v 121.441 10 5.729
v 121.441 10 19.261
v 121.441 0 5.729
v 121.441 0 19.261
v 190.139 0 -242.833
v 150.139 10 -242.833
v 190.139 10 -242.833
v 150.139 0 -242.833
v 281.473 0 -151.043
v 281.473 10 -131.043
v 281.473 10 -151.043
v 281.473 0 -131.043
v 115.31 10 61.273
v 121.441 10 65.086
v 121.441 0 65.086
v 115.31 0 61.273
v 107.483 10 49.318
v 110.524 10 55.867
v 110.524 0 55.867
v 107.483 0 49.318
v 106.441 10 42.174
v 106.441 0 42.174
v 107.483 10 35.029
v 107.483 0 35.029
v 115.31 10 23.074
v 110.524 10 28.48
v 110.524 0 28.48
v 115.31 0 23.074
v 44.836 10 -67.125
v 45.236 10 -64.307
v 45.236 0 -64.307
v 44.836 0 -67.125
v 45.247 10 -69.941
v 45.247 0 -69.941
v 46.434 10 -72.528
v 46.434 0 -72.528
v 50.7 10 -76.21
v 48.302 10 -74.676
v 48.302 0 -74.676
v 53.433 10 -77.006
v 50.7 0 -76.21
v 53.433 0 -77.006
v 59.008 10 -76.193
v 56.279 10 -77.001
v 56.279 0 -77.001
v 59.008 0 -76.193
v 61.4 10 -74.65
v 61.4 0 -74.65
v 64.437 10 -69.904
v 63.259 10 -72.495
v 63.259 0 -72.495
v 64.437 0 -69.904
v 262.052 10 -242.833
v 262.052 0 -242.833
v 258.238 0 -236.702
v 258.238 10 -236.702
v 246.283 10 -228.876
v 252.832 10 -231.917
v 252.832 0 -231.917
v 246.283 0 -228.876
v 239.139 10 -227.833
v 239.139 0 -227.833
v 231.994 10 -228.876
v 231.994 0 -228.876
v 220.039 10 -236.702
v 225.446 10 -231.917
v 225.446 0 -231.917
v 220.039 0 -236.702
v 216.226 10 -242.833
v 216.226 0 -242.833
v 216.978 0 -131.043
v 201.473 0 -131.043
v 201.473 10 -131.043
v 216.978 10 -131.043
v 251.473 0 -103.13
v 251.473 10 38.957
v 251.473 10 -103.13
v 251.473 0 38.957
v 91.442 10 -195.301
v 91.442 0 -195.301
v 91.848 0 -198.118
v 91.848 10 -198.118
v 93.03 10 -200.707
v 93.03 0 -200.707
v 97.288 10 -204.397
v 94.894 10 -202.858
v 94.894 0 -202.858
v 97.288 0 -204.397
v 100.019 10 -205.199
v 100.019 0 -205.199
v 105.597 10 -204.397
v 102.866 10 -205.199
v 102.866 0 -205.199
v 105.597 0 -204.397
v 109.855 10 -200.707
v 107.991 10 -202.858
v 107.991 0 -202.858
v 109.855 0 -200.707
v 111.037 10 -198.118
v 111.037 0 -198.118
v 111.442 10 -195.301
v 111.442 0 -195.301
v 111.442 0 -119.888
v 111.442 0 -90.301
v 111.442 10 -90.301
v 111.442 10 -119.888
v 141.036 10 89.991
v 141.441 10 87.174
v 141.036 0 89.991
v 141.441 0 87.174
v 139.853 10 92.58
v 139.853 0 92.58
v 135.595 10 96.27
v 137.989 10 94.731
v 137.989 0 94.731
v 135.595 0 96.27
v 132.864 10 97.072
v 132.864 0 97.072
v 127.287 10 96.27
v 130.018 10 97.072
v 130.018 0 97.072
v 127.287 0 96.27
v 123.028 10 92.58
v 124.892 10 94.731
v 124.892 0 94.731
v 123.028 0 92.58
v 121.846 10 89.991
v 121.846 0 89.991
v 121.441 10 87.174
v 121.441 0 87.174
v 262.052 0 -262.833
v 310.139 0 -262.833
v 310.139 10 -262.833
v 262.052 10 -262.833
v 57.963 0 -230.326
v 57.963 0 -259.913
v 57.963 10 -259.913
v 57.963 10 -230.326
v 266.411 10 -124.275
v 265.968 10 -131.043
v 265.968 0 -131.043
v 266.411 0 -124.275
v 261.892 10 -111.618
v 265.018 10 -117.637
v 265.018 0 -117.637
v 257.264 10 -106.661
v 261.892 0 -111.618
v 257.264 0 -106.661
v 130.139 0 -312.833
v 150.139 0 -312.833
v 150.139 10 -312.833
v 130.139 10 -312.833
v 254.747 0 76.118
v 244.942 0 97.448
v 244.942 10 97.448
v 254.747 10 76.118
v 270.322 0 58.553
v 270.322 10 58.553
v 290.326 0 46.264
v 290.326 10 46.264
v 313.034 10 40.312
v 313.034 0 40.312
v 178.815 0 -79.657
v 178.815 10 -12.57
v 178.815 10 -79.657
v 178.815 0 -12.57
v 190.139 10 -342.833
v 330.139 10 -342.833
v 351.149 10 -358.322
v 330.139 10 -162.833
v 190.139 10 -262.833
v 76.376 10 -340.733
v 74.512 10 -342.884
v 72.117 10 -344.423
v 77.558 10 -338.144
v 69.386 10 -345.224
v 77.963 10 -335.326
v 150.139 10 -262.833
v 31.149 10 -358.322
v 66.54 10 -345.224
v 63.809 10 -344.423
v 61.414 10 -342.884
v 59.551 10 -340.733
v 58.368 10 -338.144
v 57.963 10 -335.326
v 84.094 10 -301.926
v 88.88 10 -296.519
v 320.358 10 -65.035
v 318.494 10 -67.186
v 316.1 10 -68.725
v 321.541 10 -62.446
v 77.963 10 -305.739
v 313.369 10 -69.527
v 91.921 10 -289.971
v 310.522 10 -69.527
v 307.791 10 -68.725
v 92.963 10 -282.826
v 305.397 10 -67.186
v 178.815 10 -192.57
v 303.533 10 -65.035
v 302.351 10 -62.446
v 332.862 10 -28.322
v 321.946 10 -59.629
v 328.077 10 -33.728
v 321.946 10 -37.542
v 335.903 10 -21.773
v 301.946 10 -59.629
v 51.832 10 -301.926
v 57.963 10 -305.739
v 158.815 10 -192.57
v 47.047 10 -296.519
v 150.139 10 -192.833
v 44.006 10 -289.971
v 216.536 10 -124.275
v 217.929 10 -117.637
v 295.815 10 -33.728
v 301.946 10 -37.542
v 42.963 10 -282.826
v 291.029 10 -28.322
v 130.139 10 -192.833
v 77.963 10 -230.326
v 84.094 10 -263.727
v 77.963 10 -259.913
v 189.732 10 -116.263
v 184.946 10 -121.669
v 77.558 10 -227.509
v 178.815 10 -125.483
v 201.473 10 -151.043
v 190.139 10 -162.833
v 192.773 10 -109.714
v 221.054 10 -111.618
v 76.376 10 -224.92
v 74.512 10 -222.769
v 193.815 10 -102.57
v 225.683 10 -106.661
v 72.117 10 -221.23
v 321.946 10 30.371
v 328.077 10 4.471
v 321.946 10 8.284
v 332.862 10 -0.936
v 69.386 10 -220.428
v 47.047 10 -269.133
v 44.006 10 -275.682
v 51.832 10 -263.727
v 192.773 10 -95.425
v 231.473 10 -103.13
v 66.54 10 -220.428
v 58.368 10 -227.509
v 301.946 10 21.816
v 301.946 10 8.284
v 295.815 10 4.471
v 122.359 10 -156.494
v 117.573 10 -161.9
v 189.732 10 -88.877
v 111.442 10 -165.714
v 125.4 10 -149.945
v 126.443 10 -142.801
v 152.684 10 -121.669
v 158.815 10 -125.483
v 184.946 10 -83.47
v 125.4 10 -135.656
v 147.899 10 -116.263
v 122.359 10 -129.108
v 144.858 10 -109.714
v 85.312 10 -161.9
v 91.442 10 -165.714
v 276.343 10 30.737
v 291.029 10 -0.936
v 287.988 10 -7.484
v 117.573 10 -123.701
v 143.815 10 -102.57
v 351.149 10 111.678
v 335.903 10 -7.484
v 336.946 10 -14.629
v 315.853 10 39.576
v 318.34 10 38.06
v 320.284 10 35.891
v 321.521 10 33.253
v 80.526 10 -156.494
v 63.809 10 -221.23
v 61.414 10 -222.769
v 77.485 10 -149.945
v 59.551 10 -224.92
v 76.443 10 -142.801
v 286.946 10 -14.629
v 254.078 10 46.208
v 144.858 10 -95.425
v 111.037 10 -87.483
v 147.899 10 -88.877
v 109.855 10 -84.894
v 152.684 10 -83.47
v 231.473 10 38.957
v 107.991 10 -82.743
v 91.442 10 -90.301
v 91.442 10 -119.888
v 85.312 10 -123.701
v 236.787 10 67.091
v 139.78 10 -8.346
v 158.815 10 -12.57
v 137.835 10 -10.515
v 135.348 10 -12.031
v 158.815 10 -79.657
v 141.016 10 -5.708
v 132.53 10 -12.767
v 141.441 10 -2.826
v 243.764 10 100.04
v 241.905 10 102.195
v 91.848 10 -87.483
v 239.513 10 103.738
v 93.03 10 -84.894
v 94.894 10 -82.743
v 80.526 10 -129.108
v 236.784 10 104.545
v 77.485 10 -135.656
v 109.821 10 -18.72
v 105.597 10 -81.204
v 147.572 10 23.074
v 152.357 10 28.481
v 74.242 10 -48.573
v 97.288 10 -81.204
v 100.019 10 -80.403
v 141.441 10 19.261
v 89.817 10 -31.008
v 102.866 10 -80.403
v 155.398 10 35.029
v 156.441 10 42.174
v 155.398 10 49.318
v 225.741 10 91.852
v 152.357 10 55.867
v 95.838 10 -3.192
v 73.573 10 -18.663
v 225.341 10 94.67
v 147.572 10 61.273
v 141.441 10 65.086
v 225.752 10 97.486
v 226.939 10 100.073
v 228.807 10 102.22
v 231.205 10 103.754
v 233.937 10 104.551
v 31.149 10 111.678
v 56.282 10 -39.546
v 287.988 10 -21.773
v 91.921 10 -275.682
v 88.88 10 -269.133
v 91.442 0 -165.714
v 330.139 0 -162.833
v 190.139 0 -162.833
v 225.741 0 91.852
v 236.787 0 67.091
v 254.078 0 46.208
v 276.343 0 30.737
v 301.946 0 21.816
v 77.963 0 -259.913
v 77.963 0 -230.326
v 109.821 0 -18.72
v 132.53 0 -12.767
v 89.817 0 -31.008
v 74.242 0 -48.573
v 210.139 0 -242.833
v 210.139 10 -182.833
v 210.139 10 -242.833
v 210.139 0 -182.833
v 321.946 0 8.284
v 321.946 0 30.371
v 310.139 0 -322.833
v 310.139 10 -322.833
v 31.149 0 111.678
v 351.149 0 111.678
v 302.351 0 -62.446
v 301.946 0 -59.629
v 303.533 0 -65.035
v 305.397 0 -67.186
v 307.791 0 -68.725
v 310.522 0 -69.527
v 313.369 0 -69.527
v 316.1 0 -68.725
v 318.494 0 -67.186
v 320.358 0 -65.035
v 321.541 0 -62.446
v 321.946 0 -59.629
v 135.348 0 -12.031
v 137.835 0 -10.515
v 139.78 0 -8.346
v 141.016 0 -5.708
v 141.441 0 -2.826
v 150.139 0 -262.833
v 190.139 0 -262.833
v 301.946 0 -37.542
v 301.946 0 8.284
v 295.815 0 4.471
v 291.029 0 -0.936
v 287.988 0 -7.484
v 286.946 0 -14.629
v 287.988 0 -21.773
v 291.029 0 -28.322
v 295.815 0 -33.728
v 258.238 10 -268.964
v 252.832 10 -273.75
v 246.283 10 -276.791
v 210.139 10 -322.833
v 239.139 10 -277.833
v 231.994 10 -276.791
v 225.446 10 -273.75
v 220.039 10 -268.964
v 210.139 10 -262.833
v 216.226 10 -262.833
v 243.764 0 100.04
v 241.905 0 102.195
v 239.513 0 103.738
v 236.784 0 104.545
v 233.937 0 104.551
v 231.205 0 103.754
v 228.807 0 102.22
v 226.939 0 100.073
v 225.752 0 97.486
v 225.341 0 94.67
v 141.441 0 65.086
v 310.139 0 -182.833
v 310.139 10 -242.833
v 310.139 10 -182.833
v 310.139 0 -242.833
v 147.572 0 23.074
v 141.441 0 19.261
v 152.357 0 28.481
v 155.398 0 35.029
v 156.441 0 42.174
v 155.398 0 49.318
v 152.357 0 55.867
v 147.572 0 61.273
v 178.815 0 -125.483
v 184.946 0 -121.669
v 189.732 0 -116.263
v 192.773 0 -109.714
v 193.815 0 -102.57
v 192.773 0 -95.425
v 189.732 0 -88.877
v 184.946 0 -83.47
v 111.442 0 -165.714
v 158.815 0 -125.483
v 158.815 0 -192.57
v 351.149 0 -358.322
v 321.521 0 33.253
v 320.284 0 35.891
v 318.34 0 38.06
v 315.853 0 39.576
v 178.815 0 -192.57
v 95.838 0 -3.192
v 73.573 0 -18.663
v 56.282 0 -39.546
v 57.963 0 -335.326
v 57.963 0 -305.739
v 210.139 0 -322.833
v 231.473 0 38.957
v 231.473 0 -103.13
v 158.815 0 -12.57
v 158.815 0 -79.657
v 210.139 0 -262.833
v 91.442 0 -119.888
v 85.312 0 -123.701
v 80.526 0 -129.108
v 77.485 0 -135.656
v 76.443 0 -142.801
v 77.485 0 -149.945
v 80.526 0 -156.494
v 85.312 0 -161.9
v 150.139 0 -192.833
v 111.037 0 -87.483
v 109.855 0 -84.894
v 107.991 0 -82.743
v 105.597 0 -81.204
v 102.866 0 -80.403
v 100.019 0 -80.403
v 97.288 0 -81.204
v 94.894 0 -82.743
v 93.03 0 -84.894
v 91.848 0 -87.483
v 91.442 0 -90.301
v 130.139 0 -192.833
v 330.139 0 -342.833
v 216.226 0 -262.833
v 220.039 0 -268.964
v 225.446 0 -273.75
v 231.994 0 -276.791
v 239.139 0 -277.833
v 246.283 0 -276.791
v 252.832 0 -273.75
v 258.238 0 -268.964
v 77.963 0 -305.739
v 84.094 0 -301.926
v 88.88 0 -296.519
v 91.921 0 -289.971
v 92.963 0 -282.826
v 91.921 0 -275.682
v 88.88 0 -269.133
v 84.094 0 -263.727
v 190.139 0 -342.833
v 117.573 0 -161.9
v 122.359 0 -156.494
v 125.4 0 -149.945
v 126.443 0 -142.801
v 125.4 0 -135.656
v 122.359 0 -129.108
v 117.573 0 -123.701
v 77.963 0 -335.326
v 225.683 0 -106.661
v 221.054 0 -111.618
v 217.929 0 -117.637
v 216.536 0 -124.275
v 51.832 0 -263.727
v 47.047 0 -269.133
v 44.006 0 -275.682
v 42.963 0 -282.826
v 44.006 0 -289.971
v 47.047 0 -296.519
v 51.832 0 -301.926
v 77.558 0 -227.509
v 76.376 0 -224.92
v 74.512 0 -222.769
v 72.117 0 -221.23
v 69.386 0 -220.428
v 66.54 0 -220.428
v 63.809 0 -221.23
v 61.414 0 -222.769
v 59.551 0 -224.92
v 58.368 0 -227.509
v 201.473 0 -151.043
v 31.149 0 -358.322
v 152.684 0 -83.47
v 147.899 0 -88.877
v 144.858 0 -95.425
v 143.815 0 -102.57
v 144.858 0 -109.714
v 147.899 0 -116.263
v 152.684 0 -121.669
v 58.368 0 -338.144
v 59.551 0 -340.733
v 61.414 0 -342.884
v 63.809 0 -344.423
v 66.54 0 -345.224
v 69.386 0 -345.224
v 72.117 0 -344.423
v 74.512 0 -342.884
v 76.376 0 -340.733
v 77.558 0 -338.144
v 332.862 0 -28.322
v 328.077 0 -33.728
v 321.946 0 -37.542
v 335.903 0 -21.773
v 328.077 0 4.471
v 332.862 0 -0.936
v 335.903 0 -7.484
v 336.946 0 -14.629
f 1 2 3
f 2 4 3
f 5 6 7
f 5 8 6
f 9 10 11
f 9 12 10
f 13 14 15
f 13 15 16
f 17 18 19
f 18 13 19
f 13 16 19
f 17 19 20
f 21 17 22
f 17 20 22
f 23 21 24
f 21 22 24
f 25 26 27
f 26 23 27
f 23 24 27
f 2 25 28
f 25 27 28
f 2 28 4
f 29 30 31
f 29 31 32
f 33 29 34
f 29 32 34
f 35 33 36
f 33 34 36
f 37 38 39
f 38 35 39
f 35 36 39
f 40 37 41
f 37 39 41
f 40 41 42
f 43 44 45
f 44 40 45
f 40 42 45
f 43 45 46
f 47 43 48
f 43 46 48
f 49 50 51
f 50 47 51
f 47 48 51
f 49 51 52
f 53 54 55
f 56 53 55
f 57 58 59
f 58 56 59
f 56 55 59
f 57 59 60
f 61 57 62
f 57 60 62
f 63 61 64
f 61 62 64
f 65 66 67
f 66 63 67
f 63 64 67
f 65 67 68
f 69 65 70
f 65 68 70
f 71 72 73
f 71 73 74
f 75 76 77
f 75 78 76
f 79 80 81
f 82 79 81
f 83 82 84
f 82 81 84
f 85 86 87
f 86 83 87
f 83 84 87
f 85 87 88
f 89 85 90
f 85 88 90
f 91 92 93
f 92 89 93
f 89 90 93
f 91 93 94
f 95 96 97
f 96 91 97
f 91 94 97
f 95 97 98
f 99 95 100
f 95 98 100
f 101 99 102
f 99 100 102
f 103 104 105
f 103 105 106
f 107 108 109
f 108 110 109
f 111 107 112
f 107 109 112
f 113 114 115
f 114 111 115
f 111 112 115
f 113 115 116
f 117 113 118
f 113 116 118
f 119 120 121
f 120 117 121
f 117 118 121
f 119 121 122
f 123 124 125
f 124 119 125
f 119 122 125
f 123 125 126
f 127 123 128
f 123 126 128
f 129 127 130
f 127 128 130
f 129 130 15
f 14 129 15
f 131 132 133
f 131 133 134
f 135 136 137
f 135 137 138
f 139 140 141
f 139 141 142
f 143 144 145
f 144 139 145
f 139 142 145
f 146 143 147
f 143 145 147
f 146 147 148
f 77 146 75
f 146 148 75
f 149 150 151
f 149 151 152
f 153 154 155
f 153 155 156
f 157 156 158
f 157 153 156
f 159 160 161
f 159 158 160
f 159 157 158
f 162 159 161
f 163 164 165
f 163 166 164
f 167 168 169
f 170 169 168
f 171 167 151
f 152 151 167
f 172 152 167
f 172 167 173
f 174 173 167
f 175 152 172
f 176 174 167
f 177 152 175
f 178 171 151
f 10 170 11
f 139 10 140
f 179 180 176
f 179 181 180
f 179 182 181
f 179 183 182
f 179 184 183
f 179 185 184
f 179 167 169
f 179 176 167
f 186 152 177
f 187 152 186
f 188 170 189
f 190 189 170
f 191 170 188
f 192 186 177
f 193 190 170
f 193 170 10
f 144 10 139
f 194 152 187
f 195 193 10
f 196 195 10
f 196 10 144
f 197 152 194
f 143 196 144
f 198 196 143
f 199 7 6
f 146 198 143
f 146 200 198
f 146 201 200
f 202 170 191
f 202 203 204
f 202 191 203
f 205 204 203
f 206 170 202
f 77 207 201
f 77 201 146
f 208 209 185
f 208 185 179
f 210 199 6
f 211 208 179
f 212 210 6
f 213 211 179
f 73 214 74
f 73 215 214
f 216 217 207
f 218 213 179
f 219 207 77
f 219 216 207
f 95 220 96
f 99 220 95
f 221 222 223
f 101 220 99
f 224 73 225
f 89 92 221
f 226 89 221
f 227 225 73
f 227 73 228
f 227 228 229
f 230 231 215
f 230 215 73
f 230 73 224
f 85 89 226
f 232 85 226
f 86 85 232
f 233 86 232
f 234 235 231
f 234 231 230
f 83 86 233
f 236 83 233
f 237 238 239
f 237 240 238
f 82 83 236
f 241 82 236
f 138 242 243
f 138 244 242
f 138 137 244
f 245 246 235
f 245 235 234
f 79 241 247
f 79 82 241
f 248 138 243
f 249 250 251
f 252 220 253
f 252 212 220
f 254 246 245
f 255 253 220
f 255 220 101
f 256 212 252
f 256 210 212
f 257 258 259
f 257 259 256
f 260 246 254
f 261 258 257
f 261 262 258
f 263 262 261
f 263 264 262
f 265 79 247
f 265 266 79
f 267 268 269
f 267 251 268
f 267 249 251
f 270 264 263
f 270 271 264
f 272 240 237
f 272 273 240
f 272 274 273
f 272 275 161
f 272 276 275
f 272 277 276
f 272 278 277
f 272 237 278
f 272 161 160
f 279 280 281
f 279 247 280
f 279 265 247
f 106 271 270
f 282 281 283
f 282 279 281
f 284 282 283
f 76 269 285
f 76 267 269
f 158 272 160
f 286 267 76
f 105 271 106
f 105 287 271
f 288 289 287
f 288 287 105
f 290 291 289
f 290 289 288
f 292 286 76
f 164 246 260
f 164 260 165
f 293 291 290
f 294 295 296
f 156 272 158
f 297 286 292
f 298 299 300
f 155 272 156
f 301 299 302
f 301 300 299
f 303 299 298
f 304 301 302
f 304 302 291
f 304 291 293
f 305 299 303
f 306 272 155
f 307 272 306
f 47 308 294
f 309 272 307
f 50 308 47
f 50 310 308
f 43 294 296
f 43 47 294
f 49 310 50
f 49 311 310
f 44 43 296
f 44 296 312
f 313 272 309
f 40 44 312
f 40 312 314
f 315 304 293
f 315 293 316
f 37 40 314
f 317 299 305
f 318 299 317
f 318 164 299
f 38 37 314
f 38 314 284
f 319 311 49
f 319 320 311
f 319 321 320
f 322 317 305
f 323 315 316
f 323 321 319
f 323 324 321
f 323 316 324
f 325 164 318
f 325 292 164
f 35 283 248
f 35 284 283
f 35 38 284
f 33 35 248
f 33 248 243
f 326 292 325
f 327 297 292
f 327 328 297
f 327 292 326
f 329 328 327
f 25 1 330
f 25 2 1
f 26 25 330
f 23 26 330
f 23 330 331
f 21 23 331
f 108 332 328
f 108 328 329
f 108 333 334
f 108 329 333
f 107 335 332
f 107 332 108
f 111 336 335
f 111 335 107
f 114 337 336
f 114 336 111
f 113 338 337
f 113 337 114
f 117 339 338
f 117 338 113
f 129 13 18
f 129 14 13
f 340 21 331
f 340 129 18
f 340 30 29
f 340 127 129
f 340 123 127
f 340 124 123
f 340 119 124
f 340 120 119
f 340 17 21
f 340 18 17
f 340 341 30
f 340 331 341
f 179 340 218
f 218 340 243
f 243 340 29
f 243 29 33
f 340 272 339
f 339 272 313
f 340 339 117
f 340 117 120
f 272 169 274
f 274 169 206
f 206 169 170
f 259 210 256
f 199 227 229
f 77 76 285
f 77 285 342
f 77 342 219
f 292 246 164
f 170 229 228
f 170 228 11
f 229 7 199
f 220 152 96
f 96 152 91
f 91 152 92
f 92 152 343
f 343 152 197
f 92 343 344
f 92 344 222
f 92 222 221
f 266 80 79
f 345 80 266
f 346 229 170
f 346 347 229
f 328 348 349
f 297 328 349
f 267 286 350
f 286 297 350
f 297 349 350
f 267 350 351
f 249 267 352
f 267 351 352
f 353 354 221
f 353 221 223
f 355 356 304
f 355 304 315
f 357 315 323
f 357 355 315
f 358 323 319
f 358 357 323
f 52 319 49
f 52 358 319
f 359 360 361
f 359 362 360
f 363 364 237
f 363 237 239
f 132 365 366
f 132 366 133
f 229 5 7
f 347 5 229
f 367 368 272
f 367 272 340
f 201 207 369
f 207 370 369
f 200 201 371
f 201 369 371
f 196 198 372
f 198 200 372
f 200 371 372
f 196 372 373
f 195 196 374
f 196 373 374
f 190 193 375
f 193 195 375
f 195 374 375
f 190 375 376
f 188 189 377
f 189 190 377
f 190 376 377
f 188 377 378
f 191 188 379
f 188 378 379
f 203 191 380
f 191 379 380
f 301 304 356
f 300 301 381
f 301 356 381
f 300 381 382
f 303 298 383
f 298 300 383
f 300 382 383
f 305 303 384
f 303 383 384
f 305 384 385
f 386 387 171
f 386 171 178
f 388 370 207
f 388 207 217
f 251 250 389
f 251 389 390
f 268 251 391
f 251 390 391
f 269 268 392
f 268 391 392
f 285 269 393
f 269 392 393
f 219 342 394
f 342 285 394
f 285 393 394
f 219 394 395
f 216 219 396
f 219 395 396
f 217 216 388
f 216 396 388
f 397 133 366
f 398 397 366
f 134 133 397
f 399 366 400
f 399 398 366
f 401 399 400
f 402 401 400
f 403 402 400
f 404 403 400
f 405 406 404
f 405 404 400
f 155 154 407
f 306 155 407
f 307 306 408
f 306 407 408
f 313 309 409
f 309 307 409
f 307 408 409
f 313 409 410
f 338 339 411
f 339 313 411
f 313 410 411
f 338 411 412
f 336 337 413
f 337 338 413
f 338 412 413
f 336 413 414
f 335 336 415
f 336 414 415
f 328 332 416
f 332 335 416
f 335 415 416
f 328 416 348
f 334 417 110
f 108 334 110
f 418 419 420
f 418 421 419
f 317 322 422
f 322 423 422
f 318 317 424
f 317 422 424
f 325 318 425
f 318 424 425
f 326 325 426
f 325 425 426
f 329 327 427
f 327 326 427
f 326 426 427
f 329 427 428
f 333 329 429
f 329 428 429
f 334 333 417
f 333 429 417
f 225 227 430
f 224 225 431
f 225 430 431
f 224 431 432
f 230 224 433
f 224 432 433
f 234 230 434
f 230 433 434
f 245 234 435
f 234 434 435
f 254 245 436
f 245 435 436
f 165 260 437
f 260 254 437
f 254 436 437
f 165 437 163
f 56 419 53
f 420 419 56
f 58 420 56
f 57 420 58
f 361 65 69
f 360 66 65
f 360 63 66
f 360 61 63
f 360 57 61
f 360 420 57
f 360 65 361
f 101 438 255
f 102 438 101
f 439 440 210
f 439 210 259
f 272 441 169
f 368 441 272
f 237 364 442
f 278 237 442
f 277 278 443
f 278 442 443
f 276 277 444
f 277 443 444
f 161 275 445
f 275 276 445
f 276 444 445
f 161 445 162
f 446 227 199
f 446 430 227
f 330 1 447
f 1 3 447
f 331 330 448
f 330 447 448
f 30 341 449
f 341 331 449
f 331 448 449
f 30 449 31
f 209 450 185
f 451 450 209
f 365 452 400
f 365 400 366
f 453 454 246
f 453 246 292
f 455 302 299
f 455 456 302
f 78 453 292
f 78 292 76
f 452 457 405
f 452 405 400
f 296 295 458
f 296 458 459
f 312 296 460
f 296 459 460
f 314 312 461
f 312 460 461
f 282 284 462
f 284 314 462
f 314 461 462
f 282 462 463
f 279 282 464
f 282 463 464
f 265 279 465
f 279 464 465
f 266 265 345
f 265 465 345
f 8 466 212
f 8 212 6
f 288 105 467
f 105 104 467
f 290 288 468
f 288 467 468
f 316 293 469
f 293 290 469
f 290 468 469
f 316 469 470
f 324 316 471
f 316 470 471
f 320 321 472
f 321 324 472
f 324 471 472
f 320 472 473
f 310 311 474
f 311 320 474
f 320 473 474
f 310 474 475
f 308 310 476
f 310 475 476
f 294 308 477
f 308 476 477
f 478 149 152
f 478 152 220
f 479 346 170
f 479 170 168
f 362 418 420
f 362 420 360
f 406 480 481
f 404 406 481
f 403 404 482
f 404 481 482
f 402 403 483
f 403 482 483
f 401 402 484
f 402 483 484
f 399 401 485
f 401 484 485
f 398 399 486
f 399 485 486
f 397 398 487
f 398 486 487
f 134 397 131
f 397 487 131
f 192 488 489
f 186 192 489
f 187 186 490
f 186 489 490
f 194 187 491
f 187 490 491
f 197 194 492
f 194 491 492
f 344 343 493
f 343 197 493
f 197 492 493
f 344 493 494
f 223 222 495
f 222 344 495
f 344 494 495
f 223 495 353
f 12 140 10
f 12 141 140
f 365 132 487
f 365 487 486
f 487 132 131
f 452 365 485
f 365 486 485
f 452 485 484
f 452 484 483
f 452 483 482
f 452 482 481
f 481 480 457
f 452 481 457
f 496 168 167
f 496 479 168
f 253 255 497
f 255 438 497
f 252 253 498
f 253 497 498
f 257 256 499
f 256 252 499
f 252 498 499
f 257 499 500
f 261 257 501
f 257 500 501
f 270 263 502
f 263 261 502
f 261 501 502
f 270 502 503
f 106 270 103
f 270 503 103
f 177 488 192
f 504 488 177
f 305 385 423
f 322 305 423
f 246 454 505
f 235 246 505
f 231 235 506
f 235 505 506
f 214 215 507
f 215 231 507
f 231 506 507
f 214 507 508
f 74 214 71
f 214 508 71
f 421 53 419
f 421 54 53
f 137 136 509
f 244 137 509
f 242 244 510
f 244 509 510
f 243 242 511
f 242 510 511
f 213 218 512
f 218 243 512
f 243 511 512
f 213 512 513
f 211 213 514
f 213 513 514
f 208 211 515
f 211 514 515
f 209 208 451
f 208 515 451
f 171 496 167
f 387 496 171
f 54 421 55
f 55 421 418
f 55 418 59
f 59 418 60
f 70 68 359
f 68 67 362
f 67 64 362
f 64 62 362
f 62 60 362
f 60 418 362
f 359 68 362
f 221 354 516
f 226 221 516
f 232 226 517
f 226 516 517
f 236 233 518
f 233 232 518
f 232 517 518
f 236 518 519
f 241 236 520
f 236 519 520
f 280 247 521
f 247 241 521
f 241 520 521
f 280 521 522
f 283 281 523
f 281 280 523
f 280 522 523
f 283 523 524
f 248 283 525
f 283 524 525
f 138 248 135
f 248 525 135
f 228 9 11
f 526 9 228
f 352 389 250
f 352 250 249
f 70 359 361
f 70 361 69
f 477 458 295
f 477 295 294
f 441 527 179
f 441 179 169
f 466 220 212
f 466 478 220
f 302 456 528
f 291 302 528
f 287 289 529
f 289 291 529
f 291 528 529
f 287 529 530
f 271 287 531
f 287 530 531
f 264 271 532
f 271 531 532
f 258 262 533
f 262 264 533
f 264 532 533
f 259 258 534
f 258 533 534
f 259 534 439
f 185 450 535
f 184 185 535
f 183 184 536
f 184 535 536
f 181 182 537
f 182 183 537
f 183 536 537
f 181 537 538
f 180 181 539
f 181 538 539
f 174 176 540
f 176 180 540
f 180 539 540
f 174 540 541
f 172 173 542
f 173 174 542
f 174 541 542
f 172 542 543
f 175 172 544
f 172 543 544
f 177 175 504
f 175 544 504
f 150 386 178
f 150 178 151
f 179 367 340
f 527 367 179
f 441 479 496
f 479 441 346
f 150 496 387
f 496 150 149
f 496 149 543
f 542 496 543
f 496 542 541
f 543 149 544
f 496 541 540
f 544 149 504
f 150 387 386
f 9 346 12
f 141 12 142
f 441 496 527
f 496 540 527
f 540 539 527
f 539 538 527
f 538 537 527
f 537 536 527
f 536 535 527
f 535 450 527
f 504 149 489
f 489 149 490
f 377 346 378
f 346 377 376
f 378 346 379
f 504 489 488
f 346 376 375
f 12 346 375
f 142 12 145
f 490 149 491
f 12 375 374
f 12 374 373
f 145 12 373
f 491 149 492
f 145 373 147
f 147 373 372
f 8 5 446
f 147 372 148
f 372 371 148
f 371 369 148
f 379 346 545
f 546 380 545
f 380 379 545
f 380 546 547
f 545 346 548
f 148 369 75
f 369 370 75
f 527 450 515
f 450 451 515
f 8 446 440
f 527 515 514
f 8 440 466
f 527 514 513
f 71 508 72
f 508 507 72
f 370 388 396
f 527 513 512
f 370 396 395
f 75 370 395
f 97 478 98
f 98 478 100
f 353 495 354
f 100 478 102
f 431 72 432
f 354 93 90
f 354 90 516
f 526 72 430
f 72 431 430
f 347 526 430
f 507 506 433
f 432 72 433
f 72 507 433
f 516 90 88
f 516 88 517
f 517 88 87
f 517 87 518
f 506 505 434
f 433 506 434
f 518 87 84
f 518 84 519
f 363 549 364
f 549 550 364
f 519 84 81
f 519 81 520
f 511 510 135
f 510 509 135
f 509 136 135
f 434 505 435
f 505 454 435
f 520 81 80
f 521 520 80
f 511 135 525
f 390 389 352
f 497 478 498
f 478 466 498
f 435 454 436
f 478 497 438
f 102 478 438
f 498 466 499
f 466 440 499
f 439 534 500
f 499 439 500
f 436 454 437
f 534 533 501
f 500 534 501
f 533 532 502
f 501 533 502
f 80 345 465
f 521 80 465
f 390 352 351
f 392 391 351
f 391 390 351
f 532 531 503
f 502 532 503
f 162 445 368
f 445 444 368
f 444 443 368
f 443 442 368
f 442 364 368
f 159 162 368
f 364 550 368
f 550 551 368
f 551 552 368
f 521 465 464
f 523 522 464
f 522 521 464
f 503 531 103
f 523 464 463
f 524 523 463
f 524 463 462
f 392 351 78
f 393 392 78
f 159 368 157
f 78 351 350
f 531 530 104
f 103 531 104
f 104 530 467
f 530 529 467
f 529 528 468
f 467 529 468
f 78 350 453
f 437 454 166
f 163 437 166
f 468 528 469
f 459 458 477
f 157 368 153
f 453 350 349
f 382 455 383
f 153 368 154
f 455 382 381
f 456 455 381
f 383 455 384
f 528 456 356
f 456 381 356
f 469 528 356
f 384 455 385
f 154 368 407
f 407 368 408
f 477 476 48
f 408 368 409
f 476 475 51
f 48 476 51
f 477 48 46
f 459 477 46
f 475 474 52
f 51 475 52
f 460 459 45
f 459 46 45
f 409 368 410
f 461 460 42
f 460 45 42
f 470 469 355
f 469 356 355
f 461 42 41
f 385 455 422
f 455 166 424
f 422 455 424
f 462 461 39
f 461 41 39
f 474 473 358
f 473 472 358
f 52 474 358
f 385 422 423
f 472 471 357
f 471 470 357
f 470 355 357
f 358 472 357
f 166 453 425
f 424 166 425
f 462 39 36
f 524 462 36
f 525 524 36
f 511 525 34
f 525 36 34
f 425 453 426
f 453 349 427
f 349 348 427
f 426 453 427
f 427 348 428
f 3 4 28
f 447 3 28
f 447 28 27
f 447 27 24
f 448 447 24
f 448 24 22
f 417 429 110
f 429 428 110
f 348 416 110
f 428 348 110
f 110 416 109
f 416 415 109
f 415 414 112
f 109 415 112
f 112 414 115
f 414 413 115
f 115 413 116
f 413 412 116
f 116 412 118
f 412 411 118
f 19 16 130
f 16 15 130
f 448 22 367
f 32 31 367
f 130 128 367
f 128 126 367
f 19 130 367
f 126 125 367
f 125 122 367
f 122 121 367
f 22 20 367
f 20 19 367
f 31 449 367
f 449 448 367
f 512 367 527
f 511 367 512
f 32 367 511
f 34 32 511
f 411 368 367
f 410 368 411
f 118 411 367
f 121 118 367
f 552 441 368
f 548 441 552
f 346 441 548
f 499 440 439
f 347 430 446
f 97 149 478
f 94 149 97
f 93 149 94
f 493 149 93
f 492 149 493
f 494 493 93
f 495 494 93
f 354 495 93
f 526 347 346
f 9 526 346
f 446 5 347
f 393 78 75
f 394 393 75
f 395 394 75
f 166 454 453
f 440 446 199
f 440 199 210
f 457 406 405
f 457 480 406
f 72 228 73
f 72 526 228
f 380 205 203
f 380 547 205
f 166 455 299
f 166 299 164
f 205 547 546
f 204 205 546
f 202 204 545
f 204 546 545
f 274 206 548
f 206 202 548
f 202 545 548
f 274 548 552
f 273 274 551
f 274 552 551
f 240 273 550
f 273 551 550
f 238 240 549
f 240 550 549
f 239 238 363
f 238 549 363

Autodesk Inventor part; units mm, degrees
ref_plane "YZ Plane" through (0, 0, 0) normal (1, 0, 0) x (0, 1, 0)
ref_plane "XZ Plane" through (0, 0, 0) normal (0, 1, 0) x (-1, 0, 0)
ref_plane "XY Plane" through (0, 0, 0) normal (0, 0, 1) x (1, 0, 0)
sketch "Boceto1" plane through (0, 0, 0) normal (0, 1, 0) x (-1, 0, 0)
  line L0 (-351.1493, 111.6779) -> (-31.1493, 111.6779) projected
  line L1 (-351.1493, -358.3221) -> (-351.1493, 111.6779) projected
  line L2 (-31.1493, -358.3221) -> (-351.1493, -358.3221) projected
  line L3 (-31.1493, 111.6779) -> (-31.1493, -358.3221) projected
  line L4 (-91.4425, -195.3008) -> (-91.4425, -165.7136) projected
  arc A0 (-111.4425, -195.3008) -> (-91.4425, -195.3008) centre (-101.4425, -195.3008) ccw projected
  line L5 (-111.4425, -165.7136) -> (-111.4425, -195.3008) projected
  arc A1 (-111.4425, -119.8879) -> (-111.4425, -165.7136) centre (-101.4425, -142.8008) ccw projected
  line L6 (-111.4425, -90.3008) -> (-111.4425, -119.8879) projected
  arc A2 (-91.4425, -90.3008) -> (-111.4425, -90.3008) centre (-101.4425, -90.3008) ccw projected
  line L7 (-91.4425, -119.8879) -> (-91.4425, -90.3008) projected
  arc A3 (-91.4425, -165.7136) -> (-91.4425, -119.8879) centre (-101.4425, -142.8008) ccw projected
  circle A4 centre (-101.4425, -90.3008) radius 4 projected
  circle A5 centre (-101.4425, -195.3008) radius 4 projected
  line L8 (-57.9631, -335.3262) -> (-57.9631, -305.739) projected
  arc A6 (-77.9631, -335.3262) -> (-57.9631, -335.3262) centre (-67.9631, -335.3262) ccw projected
  line L9 (-77.9631, -305.739) -> (-77.9631, -335.3262) projected
  arc A7 (-77.9631, -259.9133) -> (-77.9631, -305.739) centre (-67.9631, -282.8262) ccw projected
  line L10 (-77.9631, -230.3262) -> (-77.9631, -259.9133) projected
  arc A8 (-57.9631, -230.3262) -> (-77.9631, -230.3262) centre (-67.9631, -230.3262) ccw projected
  line L11 (-57.9631, -259.9133) -> (-57.9631, -230.3262) projected
  arc A9 (-57.9631, -305.739) -> (-57.9631, -259.9133) centre (-67.9631, -282.8262) ccw projected
  circle A10 centre (-67.9631, -230.3262) radius 4 projected
  circle A11 centre (-67.9631, -335.3262) radius 4 projected
  circle A12 centre (-320.1388, -332.8331) radius 4 projected
  circle A13 centre (-320.1388, -172.8331) radius 4 projected
  line L12 (-150.1388, -312.8331) -> (-130.1388, -312.8331) projected
  line L13 (-150.1388, -262.8331) -> (-150.1388, -312.8331) projected
  line L14 (-190.1388, -262.8331) -> (-150.1388, -262.8331) projected
  line L15 (-190.1388, -342.8331) -> (-190.1388, -262.8331) projected
  line L16 (-330.1388, -342.8331) -> (-190.1388, -342.8331) projected
  line L17 (-330.1388, -162.8331) -> (-330.1388, -342.8331) projected
  line L18 (-190.1388, -162.8331) -> (-330.1388, -162.8331) projected
  line L19 (-190.1388, -242.8331) -> (-190.1388, -162.8331) projected
  line L20 (-150.1388, -242.8331) -> (-190.1388, -242.8331) projected
  line L21 (-150.1388, -192.8331) -> (-150.1388, -242.8331) projected
  line L22 (-130.1388, -192.8331) -> (-150.1388, -192.8331) projected
  line L23 (-130.1388, -312.8331) -> (-130.1388, -192.8331) projected
  circle A14 centre (-140.1388, -303.8331) radius 4 projected
  circle A15 centre (-140.1388, -201.8331) radius 4 projected
  line L24 (-210.1388, -262.8331) -> (-210.1388, -322.8331) projected
  line L25 (-216.2259, -262.8331) -> (-210.1388, -262.8331) projected
  arc A16 (-262.0517, -262.8331) -> (-216.2259, -262.8331) centre (-239.1388, -252.8331) ccw projected
  line L26 (-310.1388, -262.8331) -> (-262.0517, -262.8331) projected
  line L27 (-310.1388, -322.8331) -> (-310.1388, -262.8331) projected
  line L28 (-210.1388, -322.8331) -> (-310.1388, -322.8331) projected
  line L29 (-210.1388, -242.8331) -> (-216.2259, -242.8331) projected
  line L30 (-210.1388, -182.8331) -> (-210.1388, -242.8331) projected
  line L31 (-310.1388, -182.8331) -> (-210.1388, -182.8331) projected
  line L32 (-310.1388, -242.8331) -> (-310.1388, -182.8331) projected
  line L33 (-262.0517, -242.8331) -> (-310.1388, -242.8331) projected
  arc A17 (-216.2259, -242.8331) -> (-262.0517, -242.8331) centre (-239.1388, -252.8331) ccw projected
  line L34 (-265.9681, -131.0427) -> (-281.4732, -131.0427) projected
  arc A18 (-251.4732, -103.1298) -> (-265.9681, -131.0427) centre (-241.4732, -126.0427) ccw projected
  line L35 (-251.4732, 38.9573) -> (-251.4732, -103.1298) projected
  line L36 (-231.4732, 38.9573) -> (-251.4732, 38.9573) projected
  line L37 (-231.4732, -103.1298) -> (-231.4732, 38.9573) projected
  arc A19 (-216.9783, -131.0427) -> (-231.4732, -103.1298) centre (-241.4732, -126.0427) ccw projected
  line L38 (-201.4732, -131.0427) -> (-216.9783, -131.0427) projected
  line L39 (-201.4732, -151.0427) -> (-201.4732, -131.0427) projected
  line L40 (-281.4732, -151.0427) -> (-201.4732, -151.0427) projected
  line L41 (-281.4732, -131.0427) -> (-281.4732, -151.0427) projected
  circle A20 centre (-207.4732, -141.0427) radius 4 projected
  circle A21 centre (-275.4732, -141.0427) radius 4 projected
  circle A22 centre (-168.8154, -182.57) radius 4 projected
  line L42 (-178.8154, -12.57) -> (-178.8154, -79.6571) projected
  line L43 (-158.8154, -12.57) -> (-178.8154, -12.57) projected
  line L44 (-158.8154, -79.6571) -> (-158.8154, -12.57) projected
  arc A23 (-158.8154, -125.4828) -> (-158.8154, -79.6571) centre (-168.8154, -102.57) ccw projected
  line L45 (-158.8154, -192.57) -> (-158.8154, -125.4828) projected
  line L46 (-178.8154, -192.57) -> (-158.8154, -192.57) projected
  line L47 (-178.8154, -125.4828) -> (-178.8154, -192.57) projected
  arc A24 (-178.8154, -79.6571) -> (-178.8154, -125.4828) centre (-168.8154, -102.57) ccw projected
  circle A25 centre (-168.8154, -22.57) radius 4 projected
  line L48 (-141.4407, -2.8264) -> (-141.4407, 19.2607) projected
  arc A26 (-141.4407, 65.0864) -> (-141.4407, 19.2607) centre (-131.4407, 42.1736) ccw projected
  line L49 (-141.4407, 65.0864) -> (-141.4407, 87.1736) projected
  arc A27 (-121.4407, 87.1736) -> (-141.4407, 87.1736) centre (-131.4407, 87.1736) ccw projected
  line L50 (-121.4407, 87.1736) -> (-121.4407, 65.0864) projected
  arc A28 (-121.4407, 19.2607) -> (-121.4407, 65.0864) centre (-131.4407, 42.1736) ccw projected
  line L51 (-121.4407, 19.2607) -> (-121.4407, 5.729) projected
  arc A29 (-45.2358, -64.3067) -> (-121.4407, 5.729) centre (-141.2403, -92.2913) ccw projected
  arc A30 (-64.4367, -69.9037) -> (-45.2358, -64.3067) centre (-54.8362, -67.1052) ccw projected
  arc A31 (-64.4367, -69.9037) -> (-132.5295, -12.767) centre (-141.2403, -92.2913) ccw projected
  arc A32 (-141.4407, -2.8264) -> (-132.5295, -12.767) centre (-131.4407, -2.8264) ccw projected
  circle A33 centre (-131.4407, 87.1736) radius 4 projected
  circle A34 centre (-131.4407, -2.8264) radius 4 projected
  line L52 (-321.9456, 30.3713) -> (-321.9456, 8.2841) projected
  arc A35 (-313.0345, 40.3118) -> (-321.9456, 30.3713) centre (-311.9456, 30.3713) ccw projected
  arc A36 (-313.0345, 40.3118) -> (-244.9416, 97.4485) centre (-321.7452, 119.8362) ccw projected
  arc A37 (-225.7407, 91.8516) -> (-244.9416, 97.4485) centre (-235.3412, 94.65) ccw projected
  arc A38 (-301.9456, 21.8159) -> (-225.7407, 91.8516) centre (-321.7452, 119.8362) ccw projected
  line L53 (-301.9456, 8.2841) -> (-301.9456, 21.8159) projected
  arc A39 (-301.9456, -37.5416) -> (-301.9456, 8.2841) centre (-311.9456, -14.6287) ccw projected
  line L54 (-301.9456, -59.6287) -> (-301.9456, -37.5416) projected
  arc A40 (-321.9456, -59.6287) -> (-301.9456, -59.6287) centre (-311.9456, -59.6287) ccw projected
  line L55 (-321.9456, -37.5416) -> (-321.9456, -59.6287) projected
  arc A41 (-321.9456, 8.2841) -> (-321.9456, -37.5416) centre (-311.9456, -14.6287) ccw projected
  circle A42 centre (-311.9456, -59.6287) radius 4 projected
  circle A43 centre (-311.9456, 30.3713) radius 4 projected
  point P0 (0, 0)
extrude "Extrusión1" add sketch "Boceto1" along normal blind 10 contours L0 L3 L2 L1 | L24 L28 L27 L26 A16 L25 | L29 A17 L33 L32 L31 L30
properties part number "PiezaACortarApoyoInicialV3_0"
